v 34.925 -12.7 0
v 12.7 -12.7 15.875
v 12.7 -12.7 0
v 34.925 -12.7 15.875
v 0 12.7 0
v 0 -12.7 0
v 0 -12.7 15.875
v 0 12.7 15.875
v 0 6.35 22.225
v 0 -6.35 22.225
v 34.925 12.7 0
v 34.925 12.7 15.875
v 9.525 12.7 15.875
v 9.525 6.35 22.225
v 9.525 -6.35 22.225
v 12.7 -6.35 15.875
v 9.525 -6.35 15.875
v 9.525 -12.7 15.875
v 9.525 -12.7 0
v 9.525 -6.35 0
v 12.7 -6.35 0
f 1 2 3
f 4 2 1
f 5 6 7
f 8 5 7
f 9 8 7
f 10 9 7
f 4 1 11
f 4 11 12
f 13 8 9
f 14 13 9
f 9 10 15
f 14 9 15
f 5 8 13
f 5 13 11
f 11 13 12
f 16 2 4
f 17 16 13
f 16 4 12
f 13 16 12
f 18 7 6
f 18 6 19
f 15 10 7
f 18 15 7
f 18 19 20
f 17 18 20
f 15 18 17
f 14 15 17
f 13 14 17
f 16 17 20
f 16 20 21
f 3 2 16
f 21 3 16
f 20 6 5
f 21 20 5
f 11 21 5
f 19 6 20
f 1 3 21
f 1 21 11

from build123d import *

# Parameters (mm, degrees)
F0_W     = 34.925
F0_H     = 22.225
F1_DEPTH = 12.7
F3_DEPTH = 34.926
F5_DEPTH = 25.4
F7_DEPTH = 34.926
F8_W     = 3.175
F8_H     = 6.35
F9_DEPTH = 15.876


with BuildPart() as f1:
    # F0 (on Front) → F1 (new body, symmetric)
    with BuildSketch(Plane.XZ):
        with Locations((17.4625, 11.1125)):
            Rectangle(F0_W, F0_H)
    extrude(amount=F1_DEPTH, both=True)

    # F2 (on face) → F3 (cut, through all)
    with BuildSketch(Plane(origin=(0, 0, 0), x_dir=(0, -1, 0), z_dir=(-1, 0, 0))):
        Polygon((12.7, 15.875), (12.7, 22.225), (6.35, 22.225), align=None)
    extrude(amount=-F3_DEPTH, mode=Mode.SUBTRACT)

    # F4 (on face) → F5 (cut)
    with BuildSketch(Plane.YZ.offset(34.925)):
        Polygon((-6.35, 22.225), (-12.7, 15.875), (12.7, 15.875), (12.7, 22.225), align=None)
    extrude(amount=-F5_DEPTH, mode=Mode.SUBTRACT)

    # F6 (on face) → F7 (cut, through all)
    with BuildSketch(Plane(origin=(0, 0, 0), x_dir=(0, -1, 0), z_dir=(-1, 0, 0))):
        Polygon((-6.35, 22.225), (-12.7, 22.225), (-12.7, 15.875), align=None)
    extrude(amount=-F7_DEPTH, mode=Mode.SUBTRACT)

    # F8 (on face) → F9 (cut, through all)
    with BuildSketch(Plane.XY.offset(15.875)):
        with Locations((11.1125, -9.525)):
            Rectangle(F8_W, F8_H)
    extrude(amount=-F9_DEPTH, mode=Mode.SUBTRACT)


solid = f1.part
